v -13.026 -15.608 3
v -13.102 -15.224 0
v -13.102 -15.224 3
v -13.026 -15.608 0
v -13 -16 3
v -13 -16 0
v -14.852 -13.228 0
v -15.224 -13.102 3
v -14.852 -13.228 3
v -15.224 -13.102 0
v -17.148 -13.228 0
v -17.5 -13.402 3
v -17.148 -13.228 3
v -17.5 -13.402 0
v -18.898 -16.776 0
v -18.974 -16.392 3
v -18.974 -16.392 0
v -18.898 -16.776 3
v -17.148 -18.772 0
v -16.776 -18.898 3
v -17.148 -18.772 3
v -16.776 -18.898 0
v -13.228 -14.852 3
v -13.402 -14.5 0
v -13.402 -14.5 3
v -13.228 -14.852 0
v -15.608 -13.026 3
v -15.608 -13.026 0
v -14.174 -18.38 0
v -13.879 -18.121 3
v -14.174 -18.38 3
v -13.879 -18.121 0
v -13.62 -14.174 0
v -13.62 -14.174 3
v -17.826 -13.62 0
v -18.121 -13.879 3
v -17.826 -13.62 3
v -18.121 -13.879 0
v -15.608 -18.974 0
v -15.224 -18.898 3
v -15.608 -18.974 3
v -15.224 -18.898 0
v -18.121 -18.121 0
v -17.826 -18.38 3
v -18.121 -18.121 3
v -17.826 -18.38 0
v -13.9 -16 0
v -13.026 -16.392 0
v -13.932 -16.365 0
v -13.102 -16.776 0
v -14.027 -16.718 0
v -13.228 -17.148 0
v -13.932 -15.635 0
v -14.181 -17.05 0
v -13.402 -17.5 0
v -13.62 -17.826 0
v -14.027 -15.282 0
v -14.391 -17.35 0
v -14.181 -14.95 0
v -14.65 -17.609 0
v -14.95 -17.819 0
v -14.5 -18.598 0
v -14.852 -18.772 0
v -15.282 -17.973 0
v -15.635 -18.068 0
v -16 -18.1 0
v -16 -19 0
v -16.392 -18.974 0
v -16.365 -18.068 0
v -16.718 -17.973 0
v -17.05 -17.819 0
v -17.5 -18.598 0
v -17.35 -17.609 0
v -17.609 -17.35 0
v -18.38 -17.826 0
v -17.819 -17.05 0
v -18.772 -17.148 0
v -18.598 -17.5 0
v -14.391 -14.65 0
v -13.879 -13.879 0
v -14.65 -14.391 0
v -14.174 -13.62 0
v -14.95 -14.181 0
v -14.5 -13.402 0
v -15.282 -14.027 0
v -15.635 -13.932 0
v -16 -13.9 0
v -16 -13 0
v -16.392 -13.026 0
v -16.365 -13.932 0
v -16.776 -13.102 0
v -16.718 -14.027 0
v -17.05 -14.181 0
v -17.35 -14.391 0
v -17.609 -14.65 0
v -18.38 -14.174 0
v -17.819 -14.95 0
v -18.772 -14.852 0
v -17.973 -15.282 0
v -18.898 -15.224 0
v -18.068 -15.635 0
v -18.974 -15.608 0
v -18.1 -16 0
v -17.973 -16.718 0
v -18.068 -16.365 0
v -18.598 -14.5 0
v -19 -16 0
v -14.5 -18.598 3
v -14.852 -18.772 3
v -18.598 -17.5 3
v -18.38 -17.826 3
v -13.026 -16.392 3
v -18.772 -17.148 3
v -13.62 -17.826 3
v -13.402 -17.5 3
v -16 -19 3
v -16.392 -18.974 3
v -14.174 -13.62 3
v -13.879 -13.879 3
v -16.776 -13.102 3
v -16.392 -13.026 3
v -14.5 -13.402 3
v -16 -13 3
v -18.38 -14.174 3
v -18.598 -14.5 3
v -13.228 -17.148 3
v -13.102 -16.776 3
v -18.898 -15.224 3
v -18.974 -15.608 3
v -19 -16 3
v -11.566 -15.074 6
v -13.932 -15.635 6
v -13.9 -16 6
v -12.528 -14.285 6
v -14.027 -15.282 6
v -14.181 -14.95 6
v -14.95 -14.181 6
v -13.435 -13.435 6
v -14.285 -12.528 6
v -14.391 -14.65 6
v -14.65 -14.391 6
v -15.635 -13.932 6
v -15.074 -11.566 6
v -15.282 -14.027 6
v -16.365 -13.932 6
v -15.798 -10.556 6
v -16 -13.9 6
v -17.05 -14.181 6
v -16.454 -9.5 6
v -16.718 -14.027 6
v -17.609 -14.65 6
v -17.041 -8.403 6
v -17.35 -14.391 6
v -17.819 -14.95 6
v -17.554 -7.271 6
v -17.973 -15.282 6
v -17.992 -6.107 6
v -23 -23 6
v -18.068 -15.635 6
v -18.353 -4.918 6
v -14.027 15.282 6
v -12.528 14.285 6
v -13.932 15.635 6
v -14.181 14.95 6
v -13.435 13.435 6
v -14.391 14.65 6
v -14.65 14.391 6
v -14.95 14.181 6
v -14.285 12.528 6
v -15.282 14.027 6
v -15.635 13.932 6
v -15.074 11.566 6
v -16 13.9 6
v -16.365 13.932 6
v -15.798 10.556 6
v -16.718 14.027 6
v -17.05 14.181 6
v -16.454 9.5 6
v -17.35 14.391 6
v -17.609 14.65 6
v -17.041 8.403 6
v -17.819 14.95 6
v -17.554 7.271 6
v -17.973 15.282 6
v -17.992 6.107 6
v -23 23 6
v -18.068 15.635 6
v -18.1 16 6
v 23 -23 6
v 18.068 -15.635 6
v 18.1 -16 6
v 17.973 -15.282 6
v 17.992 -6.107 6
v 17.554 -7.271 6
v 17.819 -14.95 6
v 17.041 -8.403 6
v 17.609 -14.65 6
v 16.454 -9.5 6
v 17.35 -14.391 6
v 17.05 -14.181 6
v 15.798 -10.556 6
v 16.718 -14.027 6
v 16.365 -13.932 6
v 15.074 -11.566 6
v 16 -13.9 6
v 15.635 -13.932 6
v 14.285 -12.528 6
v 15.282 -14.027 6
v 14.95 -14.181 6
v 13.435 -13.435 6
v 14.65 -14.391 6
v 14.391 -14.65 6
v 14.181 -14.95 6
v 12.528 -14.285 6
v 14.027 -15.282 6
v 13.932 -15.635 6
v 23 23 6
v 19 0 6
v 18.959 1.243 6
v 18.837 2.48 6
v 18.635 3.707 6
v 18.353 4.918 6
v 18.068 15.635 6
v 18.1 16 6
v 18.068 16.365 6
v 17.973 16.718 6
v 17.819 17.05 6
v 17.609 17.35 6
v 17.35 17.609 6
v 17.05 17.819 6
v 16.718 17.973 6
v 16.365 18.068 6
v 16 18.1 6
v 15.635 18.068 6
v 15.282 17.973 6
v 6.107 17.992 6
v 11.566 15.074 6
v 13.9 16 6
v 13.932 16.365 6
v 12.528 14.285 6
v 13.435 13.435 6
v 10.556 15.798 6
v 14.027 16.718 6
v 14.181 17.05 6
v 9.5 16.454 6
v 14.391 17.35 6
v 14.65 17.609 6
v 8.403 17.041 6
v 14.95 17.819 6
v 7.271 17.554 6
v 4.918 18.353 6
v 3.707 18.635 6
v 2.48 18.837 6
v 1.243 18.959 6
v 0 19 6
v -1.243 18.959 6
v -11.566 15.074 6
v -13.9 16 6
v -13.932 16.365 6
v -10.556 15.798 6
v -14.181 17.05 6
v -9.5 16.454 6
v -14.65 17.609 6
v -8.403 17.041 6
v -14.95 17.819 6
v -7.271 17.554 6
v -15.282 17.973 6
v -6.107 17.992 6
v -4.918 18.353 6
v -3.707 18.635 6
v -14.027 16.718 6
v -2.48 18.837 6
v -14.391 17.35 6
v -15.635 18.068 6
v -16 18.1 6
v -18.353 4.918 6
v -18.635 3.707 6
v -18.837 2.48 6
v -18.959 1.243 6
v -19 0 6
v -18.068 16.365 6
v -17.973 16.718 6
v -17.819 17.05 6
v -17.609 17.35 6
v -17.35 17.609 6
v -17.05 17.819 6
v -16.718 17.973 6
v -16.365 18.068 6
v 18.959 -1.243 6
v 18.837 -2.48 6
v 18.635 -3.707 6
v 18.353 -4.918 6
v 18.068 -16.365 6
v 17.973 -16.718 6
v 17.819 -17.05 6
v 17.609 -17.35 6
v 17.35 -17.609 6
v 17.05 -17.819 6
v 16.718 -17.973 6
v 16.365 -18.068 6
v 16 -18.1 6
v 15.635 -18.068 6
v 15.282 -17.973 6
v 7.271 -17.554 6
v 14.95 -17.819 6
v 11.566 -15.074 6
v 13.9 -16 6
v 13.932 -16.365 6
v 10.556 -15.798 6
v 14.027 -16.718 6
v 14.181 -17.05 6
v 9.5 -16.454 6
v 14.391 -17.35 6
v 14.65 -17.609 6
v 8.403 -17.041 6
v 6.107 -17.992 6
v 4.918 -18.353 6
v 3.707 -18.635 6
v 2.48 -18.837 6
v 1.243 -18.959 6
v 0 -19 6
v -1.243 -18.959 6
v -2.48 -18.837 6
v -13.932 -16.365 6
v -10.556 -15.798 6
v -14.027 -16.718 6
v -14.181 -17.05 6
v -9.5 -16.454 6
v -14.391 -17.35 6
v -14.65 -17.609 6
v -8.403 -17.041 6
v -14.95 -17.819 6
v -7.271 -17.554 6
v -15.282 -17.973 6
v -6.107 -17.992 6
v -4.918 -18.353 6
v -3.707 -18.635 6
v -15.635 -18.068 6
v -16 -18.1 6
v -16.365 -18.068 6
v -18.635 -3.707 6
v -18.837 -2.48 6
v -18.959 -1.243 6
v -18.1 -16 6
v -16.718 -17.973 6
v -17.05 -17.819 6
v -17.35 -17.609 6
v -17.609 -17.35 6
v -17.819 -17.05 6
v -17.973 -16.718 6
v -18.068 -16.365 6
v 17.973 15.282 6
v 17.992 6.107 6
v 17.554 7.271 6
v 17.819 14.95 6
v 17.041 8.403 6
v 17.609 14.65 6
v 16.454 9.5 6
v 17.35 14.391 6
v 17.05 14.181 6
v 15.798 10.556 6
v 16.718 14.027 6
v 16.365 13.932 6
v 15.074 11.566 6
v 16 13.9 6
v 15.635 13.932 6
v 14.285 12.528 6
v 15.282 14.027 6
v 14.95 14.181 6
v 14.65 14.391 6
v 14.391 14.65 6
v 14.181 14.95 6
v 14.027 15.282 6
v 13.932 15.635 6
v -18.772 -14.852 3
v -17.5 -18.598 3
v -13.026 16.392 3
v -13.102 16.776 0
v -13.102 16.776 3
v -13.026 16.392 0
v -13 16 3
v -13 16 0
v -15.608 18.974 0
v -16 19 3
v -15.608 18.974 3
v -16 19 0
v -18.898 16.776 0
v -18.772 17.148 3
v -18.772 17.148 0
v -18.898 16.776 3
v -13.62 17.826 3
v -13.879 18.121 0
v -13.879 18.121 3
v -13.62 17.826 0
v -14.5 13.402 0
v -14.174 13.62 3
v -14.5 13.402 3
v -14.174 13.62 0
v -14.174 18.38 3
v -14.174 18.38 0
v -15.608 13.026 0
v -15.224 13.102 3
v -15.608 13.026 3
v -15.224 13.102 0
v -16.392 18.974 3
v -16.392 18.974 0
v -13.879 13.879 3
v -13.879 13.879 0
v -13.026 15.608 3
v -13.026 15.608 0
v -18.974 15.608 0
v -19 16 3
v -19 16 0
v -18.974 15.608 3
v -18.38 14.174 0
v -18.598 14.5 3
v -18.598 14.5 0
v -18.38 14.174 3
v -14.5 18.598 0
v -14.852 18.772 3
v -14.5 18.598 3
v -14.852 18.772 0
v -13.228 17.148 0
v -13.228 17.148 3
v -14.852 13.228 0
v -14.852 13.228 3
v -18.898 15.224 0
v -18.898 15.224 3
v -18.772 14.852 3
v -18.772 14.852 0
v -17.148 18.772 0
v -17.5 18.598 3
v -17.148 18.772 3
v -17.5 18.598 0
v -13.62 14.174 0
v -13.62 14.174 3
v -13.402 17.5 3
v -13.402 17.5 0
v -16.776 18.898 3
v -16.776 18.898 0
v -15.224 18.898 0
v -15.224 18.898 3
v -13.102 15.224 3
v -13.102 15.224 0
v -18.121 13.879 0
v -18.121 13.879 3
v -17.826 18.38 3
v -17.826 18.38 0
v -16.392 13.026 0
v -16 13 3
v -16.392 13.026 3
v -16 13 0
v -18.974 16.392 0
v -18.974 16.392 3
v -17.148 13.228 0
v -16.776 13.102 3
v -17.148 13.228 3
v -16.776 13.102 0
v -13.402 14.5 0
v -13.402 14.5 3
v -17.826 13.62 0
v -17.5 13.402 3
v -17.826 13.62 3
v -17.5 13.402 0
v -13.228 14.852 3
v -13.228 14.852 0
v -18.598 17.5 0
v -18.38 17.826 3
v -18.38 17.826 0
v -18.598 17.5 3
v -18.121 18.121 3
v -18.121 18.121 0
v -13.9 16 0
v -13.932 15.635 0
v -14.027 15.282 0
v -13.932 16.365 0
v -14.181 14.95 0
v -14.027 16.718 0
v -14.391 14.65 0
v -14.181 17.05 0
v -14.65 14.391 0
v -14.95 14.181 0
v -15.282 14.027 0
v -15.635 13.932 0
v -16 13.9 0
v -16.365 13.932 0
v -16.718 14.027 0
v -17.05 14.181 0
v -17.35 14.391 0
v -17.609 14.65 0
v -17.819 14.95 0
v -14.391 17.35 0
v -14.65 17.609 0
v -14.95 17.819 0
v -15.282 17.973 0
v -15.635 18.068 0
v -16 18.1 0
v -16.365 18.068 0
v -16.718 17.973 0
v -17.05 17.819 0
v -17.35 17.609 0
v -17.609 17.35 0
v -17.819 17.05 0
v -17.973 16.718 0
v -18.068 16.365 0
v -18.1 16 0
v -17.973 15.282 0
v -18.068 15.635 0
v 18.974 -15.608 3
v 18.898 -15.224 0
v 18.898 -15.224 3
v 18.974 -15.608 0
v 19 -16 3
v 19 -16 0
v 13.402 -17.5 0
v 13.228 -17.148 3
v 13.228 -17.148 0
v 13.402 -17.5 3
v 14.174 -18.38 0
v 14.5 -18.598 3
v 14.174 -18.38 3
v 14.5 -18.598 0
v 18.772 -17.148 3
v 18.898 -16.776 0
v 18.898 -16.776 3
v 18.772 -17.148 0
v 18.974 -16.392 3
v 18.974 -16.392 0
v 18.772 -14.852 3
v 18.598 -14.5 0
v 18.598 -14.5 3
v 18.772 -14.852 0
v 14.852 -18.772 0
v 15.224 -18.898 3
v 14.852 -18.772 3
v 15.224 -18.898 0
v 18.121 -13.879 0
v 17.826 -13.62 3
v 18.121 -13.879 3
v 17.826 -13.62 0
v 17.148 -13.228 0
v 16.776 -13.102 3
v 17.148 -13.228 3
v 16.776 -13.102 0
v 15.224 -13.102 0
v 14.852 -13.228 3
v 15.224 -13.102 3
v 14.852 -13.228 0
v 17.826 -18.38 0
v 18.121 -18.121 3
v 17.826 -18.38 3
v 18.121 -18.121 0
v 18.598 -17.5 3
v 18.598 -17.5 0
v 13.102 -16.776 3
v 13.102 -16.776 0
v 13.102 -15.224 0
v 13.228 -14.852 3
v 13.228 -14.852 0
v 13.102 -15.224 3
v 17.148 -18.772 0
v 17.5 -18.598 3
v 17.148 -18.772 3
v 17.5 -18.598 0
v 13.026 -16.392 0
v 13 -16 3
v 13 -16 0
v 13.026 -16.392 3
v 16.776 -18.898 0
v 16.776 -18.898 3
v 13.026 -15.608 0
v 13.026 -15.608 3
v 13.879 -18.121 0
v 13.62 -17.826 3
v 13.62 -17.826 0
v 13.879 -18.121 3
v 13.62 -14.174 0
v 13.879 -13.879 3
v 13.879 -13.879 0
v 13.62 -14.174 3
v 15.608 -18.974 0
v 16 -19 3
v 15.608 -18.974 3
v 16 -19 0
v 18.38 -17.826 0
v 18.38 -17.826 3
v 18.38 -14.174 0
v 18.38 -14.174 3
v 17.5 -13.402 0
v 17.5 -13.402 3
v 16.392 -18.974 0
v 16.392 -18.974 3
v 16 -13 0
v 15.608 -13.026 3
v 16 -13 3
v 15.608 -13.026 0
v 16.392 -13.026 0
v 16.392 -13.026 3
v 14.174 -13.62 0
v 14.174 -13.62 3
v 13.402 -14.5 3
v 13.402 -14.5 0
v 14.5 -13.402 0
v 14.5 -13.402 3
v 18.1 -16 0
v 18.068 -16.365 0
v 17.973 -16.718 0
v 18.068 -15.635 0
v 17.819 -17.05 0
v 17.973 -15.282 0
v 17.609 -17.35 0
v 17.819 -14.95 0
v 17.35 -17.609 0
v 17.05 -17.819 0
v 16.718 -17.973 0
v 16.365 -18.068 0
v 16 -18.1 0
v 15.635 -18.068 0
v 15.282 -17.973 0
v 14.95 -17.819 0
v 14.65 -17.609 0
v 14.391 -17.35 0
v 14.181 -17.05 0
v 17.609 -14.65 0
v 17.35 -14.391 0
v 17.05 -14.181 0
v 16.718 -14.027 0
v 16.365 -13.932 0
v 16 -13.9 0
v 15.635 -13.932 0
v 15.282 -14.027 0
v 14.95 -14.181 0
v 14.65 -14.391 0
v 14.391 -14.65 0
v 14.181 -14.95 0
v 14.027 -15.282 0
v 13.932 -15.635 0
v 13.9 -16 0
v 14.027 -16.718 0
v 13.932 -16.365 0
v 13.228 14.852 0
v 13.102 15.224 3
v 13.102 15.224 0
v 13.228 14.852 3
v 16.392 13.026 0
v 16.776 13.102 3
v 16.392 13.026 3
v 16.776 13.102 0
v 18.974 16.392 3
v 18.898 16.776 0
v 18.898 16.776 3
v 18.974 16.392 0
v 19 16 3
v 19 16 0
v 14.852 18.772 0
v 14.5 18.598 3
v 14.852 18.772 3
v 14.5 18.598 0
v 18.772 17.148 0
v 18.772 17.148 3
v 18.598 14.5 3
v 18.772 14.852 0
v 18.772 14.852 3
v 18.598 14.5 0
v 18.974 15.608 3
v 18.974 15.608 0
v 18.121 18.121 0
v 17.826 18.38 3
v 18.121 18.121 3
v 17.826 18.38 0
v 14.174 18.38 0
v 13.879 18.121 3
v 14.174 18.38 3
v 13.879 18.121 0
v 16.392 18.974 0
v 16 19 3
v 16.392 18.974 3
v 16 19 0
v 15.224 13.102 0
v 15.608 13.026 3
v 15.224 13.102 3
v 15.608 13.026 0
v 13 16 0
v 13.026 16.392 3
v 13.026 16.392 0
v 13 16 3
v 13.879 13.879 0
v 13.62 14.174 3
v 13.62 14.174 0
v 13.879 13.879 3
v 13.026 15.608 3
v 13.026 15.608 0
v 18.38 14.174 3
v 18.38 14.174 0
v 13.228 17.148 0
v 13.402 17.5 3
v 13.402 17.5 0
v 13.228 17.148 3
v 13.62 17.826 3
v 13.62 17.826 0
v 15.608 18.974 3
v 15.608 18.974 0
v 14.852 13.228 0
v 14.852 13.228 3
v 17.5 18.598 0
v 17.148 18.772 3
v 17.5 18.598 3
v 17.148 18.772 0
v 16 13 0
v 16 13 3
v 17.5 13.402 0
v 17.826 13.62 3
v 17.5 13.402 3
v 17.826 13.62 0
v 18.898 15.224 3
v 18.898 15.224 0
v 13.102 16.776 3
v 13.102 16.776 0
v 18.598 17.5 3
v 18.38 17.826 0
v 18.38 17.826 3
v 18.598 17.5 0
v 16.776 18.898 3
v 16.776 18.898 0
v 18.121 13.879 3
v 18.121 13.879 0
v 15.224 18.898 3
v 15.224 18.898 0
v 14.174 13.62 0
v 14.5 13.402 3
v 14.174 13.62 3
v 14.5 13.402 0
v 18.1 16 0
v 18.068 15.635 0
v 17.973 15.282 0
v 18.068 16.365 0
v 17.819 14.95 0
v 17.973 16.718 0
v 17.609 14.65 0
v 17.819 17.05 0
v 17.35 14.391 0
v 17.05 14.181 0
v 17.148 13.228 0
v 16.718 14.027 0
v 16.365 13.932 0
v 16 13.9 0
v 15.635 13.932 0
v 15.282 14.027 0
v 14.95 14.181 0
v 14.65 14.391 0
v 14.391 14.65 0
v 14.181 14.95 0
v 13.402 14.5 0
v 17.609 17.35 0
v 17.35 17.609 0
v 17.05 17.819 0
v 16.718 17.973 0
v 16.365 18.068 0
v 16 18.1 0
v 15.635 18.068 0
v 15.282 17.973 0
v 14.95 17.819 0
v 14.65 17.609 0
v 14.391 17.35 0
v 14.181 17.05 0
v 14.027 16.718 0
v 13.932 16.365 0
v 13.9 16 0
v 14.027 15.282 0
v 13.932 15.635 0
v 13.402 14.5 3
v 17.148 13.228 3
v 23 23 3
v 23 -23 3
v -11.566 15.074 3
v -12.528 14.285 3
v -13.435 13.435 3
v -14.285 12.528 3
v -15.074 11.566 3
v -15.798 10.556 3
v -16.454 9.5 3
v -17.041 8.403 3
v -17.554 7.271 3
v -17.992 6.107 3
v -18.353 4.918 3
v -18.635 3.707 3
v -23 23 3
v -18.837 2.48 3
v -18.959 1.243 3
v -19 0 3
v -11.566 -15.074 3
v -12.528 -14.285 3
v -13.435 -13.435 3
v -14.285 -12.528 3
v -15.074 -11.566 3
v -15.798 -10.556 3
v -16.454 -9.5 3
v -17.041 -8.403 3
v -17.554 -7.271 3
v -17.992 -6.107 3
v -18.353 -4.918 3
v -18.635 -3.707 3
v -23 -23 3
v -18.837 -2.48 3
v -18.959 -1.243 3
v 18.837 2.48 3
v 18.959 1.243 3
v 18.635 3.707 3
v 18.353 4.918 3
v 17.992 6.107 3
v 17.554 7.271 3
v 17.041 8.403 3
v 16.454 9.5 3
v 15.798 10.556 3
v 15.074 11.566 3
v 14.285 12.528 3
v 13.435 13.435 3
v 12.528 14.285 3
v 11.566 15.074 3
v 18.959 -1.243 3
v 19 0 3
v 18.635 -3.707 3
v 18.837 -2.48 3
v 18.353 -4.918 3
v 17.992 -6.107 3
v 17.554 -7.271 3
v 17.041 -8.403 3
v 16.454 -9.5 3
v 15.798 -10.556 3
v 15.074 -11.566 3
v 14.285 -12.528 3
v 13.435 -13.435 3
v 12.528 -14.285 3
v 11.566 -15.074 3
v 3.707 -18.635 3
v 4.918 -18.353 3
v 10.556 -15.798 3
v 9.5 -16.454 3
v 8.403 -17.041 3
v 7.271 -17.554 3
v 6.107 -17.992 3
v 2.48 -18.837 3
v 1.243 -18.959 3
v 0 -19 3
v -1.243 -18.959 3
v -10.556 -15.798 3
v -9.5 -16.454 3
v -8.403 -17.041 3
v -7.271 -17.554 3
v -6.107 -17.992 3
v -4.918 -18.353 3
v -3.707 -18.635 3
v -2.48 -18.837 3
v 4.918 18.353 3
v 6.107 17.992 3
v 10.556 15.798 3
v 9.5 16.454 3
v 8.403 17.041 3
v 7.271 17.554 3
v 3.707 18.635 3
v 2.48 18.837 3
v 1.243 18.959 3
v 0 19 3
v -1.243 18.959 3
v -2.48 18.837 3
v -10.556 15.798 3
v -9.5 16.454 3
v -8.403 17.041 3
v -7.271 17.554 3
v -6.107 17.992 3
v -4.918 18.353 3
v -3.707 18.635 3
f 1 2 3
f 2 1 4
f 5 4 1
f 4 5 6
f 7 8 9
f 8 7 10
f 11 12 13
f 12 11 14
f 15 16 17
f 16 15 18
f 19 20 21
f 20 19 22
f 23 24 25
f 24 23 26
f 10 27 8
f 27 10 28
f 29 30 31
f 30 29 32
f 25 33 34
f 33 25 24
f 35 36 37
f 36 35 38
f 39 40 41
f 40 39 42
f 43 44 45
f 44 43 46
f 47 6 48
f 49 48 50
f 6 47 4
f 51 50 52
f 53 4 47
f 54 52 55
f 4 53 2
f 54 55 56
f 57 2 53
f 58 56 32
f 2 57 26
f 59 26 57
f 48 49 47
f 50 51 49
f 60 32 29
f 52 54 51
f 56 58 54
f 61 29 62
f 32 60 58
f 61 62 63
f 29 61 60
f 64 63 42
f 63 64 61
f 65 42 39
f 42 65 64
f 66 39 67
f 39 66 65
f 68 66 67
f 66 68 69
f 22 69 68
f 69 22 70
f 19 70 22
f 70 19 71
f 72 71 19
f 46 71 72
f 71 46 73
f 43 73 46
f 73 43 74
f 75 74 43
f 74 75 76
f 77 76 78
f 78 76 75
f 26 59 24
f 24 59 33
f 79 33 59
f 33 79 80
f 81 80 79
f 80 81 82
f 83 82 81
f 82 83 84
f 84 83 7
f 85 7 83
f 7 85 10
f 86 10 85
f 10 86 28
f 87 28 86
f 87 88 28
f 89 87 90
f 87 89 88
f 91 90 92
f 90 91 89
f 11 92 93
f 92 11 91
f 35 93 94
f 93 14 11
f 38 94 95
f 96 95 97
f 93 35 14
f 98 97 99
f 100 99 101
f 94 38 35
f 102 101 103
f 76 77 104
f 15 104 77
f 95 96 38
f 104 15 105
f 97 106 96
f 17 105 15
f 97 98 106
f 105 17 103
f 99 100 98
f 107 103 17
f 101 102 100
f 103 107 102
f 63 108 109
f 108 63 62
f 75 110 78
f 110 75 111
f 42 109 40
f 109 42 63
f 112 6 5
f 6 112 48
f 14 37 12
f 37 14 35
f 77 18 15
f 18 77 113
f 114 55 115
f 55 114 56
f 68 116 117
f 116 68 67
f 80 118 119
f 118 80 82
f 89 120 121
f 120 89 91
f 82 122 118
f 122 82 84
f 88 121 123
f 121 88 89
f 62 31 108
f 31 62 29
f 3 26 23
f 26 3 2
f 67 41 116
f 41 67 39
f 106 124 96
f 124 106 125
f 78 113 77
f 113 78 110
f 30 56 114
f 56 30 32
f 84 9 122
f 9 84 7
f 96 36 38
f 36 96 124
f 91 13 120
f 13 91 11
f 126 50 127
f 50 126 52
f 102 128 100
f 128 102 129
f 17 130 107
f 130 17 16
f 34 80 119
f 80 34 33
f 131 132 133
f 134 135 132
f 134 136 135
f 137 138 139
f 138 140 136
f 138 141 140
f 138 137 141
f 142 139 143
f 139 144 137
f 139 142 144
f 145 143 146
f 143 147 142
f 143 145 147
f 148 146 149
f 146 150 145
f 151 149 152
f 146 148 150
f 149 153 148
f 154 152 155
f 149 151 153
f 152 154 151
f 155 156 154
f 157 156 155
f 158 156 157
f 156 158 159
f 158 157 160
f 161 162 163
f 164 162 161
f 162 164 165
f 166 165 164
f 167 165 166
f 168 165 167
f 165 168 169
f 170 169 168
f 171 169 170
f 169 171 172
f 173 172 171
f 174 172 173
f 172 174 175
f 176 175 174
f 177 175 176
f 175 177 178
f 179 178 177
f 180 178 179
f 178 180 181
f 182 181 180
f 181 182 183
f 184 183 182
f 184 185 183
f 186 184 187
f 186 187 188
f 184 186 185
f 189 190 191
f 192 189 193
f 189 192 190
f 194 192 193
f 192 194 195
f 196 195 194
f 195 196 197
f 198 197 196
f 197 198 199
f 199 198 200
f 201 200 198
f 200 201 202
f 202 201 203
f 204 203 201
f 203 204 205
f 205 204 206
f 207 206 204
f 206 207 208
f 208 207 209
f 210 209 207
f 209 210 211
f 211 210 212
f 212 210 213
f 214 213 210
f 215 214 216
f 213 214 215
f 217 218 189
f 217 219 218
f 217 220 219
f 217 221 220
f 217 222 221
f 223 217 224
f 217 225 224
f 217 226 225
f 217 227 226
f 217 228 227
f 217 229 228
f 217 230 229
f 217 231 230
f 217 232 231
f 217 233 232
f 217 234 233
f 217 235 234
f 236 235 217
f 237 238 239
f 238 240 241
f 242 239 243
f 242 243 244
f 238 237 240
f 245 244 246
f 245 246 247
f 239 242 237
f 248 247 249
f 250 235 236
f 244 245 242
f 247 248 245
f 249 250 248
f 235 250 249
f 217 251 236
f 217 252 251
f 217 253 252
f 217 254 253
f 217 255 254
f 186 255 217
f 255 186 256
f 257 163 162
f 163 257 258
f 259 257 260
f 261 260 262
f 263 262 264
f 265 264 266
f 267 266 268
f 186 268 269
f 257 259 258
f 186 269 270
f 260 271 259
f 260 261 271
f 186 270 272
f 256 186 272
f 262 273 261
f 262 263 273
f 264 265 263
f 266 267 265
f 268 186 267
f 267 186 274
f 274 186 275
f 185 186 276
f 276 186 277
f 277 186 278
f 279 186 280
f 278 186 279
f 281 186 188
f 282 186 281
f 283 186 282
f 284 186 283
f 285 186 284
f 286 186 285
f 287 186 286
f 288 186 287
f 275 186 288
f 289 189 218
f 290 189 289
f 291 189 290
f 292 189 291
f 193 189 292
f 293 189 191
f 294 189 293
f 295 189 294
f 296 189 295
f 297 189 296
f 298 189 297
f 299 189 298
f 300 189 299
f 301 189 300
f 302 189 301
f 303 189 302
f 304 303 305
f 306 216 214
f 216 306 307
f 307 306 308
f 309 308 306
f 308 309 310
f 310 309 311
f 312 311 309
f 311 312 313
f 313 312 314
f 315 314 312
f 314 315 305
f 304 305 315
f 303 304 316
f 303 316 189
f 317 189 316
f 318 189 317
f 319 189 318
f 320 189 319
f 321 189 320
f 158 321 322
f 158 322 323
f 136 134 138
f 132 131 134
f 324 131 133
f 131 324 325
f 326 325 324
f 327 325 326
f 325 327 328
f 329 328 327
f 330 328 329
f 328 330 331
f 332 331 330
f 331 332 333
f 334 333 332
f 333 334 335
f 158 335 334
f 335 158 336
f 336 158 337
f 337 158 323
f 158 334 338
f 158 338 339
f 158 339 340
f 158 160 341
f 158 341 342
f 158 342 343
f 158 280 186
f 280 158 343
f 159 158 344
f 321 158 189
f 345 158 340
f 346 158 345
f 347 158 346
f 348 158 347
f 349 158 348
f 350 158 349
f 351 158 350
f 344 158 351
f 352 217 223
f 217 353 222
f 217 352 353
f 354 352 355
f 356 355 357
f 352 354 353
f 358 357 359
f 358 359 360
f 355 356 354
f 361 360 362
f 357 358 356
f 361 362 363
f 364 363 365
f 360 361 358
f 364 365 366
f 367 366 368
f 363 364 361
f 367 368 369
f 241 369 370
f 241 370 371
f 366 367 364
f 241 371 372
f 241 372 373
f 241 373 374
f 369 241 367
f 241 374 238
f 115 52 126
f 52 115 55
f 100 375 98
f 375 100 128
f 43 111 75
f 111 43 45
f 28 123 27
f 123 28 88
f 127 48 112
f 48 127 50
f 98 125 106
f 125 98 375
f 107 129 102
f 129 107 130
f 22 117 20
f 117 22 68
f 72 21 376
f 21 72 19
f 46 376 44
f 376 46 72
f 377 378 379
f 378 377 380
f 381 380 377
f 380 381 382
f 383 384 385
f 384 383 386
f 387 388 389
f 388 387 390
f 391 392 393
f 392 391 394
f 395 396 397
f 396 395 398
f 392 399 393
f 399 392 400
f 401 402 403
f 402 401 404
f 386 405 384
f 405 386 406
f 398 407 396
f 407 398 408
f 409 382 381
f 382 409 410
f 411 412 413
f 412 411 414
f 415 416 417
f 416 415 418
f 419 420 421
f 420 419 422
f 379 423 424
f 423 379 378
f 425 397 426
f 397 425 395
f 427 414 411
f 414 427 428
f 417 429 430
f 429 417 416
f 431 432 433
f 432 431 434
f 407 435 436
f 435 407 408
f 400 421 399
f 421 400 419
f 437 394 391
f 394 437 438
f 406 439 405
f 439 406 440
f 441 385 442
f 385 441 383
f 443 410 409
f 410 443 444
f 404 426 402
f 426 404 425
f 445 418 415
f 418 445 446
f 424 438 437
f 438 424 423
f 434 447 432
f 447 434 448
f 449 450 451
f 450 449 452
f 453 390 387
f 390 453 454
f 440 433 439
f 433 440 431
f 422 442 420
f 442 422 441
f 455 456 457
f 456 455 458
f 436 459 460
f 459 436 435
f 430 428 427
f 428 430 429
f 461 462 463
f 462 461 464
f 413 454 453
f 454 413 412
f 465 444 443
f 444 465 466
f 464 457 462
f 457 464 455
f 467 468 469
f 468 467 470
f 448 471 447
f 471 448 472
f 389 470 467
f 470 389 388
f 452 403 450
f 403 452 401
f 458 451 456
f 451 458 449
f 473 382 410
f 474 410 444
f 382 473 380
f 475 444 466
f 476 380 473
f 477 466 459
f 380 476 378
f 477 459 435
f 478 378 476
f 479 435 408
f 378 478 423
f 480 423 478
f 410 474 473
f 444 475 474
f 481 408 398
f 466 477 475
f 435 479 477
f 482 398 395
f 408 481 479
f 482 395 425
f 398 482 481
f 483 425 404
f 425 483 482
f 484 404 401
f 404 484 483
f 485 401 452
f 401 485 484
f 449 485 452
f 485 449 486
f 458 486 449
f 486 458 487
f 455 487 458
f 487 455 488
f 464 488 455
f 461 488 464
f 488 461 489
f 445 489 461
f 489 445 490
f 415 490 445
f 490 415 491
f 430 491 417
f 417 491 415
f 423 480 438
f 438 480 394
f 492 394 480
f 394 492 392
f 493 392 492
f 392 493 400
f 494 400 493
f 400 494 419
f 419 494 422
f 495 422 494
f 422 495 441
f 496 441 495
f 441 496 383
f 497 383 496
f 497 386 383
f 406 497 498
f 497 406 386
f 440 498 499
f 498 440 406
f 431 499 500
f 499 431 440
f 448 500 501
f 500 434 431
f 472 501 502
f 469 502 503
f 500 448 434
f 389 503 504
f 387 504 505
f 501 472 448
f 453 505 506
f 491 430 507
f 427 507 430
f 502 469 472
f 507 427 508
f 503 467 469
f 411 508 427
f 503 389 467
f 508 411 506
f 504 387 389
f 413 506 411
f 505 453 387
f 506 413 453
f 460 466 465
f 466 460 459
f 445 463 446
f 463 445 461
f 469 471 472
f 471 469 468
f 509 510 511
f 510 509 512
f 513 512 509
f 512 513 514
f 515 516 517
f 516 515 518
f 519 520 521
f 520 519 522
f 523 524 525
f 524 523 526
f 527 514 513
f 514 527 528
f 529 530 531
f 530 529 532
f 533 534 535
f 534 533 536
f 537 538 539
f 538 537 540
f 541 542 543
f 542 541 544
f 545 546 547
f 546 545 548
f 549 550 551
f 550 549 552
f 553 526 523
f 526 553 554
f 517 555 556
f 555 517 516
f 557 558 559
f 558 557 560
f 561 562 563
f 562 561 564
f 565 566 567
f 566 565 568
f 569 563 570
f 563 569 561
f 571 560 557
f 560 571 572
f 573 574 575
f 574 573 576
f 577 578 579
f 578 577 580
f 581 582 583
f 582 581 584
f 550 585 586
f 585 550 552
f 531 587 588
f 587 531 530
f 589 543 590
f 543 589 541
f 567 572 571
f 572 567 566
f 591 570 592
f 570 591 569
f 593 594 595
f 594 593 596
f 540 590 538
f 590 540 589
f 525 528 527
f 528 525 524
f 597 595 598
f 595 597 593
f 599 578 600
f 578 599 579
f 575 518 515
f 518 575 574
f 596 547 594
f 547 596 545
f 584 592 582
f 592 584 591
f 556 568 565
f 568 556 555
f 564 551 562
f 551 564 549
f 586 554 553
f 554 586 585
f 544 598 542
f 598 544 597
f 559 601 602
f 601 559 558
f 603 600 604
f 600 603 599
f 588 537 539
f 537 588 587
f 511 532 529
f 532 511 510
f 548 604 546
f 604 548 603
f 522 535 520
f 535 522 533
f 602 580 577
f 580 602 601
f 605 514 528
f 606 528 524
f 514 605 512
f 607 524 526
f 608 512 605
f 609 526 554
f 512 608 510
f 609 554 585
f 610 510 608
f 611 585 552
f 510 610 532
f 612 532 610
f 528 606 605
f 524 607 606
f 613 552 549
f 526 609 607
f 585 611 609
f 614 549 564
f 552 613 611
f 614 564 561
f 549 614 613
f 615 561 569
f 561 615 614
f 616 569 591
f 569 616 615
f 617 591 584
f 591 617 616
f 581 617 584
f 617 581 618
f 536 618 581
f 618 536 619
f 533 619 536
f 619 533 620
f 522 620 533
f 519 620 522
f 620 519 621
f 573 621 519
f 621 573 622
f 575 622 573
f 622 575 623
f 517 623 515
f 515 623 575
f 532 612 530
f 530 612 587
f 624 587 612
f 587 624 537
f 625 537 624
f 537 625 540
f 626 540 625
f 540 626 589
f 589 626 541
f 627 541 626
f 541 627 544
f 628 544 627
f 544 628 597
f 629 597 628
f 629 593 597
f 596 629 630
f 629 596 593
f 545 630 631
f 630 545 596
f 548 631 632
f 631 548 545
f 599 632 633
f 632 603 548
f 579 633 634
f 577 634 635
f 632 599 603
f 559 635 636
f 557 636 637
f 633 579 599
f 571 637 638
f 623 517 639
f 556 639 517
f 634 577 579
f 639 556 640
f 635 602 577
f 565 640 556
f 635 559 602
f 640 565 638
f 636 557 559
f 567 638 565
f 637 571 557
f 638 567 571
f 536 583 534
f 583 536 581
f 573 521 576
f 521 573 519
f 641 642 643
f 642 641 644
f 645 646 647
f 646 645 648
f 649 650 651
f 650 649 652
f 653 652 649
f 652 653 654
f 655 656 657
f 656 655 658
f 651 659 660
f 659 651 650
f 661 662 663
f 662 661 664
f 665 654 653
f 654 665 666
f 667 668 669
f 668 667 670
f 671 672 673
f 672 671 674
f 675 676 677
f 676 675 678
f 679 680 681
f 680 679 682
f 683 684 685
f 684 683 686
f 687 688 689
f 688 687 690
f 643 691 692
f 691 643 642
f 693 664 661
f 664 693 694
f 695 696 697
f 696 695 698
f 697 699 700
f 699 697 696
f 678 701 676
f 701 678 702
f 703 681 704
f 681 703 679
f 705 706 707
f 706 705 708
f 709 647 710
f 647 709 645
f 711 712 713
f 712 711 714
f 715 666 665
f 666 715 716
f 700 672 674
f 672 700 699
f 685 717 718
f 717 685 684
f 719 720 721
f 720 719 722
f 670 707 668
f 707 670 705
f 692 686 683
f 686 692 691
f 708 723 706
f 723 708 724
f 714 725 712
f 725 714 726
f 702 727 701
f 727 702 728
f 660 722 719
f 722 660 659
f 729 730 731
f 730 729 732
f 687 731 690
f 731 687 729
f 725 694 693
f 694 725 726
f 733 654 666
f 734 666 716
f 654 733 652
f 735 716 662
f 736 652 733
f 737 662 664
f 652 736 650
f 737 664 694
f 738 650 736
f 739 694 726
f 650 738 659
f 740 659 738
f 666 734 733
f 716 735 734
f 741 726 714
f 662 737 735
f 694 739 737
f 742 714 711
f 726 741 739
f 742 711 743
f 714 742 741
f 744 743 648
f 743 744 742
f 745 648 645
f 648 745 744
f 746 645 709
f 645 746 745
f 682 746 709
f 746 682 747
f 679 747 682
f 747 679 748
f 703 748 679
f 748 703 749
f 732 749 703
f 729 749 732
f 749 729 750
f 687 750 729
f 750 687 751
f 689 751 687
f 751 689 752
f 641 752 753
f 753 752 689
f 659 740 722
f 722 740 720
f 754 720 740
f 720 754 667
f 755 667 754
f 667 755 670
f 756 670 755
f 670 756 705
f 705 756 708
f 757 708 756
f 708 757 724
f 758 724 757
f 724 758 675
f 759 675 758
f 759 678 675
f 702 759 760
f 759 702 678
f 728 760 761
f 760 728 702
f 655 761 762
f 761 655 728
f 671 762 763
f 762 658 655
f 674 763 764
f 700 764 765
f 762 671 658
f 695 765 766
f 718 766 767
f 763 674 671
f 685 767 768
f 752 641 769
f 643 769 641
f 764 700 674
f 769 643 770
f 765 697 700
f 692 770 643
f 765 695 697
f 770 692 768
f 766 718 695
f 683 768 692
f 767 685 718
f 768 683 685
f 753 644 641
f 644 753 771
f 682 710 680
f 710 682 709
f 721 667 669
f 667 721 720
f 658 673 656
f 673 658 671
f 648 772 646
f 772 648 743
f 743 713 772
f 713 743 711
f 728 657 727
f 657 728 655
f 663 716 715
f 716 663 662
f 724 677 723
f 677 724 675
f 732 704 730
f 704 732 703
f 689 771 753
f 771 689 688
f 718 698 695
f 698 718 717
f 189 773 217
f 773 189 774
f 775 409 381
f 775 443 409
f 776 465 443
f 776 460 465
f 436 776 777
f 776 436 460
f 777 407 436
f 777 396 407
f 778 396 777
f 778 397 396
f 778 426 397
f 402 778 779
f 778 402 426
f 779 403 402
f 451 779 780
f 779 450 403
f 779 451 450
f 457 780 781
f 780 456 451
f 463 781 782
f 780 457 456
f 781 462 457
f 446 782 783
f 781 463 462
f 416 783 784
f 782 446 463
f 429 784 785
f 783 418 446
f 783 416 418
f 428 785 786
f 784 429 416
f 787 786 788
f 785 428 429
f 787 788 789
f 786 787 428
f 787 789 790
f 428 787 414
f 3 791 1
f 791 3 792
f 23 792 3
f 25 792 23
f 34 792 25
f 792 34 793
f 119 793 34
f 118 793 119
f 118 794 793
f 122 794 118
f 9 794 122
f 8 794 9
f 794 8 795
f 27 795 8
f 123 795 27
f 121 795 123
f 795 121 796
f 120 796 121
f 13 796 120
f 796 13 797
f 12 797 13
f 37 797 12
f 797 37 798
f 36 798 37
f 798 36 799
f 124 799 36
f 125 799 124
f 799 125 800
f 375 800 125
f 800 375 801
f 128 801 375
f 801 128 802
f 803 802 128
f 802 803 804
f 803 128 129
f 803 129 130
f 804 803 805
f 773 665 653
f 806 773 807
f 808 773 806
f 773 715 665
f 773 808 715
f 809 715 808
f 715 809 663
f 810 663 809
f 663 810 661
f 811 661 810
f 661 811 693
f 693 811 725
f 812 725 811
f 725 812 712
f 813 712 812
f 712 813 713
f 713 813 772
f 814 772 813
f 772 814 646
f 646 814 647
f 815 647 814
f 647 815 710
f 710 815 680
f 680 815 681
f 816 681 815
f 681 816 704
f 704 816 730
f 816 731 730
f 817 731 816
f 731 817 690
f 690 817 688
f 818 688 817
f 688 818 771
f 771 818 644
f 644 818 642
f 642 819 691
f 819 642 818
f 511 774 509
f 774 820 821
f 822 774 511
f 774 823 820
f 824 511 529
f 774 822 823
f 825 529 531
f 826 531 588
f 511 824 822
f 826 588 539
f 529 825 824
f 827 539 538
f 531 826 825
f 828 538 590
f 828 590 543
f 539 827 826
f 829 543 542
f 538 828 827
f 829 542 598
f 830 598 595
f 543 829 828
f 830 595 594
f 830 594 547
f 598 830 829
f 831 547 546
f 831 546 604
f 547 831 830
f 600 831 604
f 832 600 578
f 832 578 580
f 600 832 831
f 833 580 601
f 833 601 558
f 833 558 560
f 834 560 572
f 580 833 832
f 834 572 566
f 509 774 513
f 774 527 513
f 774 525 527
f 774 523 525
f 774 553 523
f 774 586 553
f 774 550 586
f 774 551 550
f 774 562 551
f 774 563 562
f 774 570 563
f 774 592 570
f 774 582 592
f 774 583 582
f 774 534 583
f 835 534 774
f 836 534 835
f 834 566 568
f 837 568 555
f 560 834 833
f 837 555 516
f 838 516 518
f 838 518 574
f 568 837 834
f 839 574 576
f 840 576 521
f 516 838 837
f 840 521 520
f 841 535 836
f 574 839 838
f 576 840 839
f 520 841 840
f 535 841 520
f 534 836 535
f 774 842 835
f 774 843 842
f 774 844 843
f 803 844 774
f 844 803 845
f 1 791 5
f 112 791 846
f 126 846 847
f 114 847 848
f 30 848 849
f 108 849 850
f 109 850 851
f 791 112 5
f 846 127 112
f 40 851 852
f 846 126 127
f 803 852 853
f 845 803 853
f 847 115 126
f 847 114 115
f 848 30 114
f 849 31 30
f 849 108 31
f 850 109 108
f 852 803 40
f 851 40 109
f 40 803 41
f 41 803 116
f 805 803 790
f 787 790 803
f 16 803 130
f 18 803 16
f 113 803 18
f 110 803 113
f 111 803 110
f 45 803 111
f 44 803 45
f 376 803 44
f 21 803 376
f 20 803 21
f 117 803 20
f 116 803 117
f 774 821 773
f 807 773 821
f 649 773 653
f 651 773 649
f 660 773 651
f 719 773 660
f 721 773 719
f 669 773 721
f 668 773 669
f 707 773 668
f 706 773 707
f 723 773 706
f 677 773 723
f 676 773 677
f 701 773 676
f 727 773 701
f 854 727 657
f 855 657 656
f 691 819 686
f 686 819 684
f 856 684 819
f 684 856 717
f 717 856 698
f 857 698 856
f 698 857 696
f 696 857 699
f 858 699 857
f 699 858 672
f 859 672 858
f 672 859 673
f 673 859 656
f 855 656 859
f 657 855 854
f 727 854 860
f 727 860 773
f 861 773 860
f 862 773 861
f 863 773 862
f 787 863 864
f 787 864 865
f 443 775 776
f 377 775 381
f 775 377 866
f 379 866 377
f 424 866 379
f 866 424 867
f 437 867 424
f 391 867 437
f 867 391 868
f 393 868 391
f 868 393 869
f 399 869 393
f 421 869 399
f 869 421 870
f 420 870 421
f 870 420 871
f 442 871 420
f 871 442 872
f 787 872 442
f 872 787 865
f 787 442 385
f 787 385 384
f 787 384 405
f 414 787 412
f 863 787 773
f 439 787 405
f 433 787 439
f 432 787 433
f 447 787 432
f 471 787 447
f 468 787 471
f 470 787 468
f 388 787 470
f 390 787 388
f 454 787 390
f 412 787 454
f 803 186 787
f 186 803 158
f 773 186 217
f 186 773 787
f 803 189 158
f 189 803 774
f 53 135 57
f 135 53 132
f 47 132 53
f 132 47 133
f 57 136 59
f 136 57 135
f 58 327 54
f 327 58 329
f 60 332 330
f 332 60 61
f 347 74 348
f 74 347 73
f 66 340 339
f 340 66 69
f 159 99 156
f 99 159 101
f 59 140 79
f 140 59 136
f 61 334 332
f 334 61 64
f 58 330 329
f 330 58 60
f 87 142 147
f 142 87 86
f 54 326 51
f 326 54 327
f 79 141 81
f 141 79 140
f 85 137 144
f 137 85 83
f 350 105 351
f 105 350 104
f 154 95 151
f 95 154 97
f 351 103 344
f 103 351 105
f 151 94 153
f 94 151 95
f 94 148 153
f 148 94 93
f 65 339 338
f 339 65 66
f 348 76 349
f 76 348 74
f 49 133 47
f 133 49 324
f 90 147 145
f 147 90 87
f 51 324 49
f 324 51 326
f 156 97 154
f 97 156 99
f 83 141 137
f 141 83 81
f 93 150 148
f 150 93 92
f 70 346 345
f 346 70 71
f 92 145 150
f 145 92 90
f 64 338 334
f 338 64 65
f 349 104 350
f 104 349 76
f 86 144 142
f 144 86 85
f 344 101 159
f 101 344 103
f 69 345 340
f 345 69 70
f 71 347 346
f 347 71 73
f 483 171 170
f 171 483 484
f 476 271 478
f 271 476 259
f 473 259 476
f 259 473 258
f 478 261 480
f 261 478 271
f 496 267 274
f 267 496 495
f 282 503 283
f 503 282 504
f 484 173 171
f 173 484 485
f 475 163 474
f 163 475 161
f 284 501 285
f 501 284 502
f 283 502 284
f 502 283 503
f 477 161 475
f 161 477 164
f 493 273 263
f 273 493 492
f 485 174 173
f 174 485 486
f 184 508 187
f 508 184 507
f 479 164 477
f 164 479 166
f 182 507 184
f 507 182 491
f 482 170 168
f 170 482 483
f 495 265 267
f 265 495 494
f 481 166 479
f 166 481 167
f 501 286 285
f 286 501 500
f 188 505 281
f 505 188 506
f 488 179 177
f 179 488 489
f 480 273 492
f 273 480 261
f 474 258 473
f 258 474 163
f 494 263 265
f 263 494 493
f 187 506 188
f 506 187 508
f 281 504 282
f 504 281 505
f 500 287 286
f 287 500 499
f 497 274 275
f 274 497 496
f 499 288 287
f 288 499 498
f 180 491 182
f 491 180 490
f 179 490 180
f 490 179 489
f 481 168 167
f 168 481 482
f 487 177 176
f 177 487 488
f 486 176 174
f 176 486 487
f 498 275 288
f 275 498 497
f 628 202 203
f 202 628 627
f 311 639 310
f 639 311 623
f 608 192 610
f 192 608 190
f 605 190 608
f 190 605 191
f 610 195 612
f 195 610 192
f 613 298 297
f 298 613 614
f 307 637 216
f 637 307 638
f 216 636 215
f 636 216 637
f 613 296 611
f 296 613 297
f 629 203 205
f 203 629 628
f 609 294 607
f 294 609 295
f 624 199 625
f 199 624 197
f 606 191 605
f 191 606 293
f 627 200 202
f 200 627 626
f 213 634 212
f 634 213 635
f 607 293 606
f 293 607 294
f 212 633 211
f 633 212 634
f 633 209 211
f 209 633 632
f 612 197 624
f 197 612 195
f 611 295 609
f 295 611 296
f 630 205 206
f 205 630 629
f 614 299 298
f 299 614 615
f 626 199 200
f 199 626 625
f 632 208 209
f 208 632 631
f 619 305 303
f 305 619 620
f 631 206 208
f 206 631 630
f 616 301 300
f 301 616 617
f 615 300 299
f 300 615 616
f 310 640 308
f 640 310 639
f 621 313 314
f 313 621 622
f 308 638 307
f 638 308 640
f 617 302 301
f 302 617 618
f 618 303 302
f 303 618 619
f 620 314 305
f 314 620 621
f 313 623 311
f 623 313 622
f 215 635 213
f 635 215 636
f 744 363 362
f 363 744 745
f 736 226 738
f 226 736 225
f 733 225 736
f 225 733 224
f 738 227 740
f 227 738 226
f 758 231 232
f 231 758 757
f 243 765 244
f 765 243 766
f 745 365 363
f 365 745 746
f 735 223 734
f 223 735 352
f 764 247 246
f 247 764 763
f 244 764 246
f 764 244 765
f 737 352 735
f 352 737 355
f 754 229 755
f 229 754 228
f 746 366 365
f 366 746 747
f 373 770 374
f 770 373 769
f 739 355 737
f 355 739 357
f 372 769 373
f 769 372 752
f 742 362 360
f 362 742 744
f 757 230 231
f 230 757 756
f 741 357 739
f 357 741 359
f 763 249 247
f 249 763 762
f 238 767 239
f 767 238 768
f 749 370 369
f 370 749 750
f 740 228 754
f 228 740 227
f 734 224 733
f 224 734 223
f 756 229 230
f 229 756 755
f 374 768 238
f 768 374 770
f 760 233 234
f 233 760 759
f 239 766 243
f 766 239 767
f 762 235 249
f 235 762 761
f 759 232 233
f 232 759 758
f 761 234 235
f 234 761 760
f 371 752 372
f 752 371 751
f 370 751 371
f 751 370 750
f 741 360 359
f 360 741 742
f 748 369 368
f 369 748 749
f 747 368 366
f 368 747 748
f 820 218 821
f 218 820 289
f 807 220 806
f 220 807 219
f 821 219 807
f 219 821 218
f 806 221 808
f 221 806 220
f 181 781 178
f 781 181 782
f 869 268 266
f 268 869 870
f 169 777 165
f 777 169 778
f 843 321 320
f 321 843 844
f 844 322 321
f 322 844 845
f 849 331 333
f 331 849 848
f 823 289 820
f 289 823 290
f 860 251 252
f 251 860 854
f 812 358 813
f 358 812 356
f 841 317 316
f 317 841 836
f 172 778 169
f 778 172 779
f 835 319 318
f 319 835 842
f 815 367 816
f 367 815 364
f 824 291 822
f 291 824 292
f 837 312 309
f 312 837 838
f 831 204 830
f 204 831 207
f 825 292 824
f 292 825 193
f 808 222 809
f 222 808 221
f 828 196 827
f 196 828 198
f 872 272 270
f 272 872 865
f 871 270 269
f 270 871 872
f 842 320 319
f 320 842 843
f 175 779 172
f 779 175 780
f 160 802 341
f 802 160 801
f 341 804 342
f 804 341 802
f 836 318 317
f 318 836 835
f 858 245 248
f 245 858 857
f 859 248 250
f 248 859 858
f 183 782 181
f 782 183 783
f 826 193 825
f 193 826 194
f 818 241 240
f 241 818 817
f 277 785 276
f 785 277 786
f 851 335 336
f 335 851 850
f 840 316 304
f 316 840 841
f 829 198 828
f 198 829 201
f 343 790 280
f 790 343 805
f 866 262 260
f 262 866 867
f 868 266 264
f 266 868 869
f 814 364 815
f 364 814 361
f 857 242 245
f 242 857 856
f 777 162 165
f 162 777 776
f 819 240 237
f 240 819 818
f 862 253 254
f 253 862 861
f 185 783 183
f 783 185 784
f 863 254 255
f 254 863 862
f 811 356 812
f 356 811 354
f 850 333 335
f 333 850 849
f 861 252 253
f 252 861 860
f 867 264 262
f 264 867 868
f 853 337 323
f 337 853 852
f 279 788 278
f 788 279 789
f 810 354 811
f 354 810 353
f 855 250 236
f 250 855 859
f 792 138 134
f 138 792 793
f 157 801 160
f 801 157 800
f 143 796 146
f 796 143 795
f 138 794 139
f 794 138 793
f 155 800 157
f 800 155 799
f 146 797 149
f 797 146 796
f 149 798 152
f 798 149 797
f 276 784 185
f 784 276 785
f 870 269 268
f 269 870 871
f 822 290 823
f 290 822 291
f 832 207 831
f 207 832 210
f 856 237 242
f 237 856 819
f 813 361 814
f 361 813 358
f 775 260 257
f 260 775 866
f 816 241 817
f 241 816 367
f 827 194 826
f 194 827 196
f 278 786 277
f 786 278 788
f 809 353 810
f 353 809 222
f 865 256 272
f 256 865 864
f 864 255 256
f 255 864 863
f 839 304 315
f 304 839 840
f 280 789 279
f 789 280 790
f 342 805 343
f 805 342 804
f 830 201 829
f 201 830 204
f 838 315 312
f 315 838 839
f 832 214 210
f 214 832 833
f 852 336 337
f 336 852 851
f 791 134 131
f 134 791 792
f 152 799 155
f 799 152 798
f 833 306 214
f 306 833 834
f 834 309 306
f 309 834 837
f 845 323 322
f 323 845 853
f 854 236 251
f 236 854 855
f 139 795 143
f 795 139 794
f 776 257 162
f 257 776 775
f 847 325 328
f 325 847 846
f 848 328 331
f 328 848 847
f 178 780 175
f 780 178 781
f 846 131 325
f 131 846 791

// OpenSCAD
// file: parts/fan_guard.scad
// Fan guard: a flat plate with a centered circular air opening, held
// standoff_height above the fan face by four M3-bored posts at the fan's four
// corner mounting stations (stud_pitch/2 on each axis).
//
// Coordinate frame (guard local, matching the case's fan interface):
//   - the fan face lies in the z = 0 plane, fan center at the origin in x/y;
//   - the posts run from z = 0 (fan face) up through the plate;
//   - the plate spans z = standoff_height .. standoff_height + plate_thickness;
//   - airflow passes axially through the center opening and radially through
//     the perimeter gap between the fan face (40 mm) and the plate (plate_size).
//
// The posts are kept OUTSIDE the blade circle (fan_blade_d) so the spinning
// tips can never contact the guard; see the blade-clearance asserts below.
// Each post is bored to stud_bore_d (== the case's fan_mount_hole_d) so the
// case's existing M3 fan screws pass through case hole -> fan hole -> post.

// Fan center is the origin in x/y.
function fan_center_x() = 0;
function fan_center_y() = 0;

// Post station offset from the fan center (half the 32 mm pitch).
function stud_offset() = stud_pitch / 2;
function stud_center_r() = sqrt(2) * stud_offset(); // radius of a station from center.
function stud_r_out() = stud_outer_d / 2;
function stud_r_in() = stud_bore_d / 2;
function cutout_r() = center_cutout_d / 2;
// Post outer edge vs the center opening edge (default: 19.6 - 3 - 19 = 0.6 mm).
function stud_opening_clearance() = stud_center_r() - stud_r_out() - cutout_r();

// Post vertical extent: from the fan face (z = 0) through the full plate
// thickness, so the embed into the plate equals plate_thickness and is a
// positive-volume join (asserted >= minimum_structural_overlap).
function stud_top_z() = standoff_height + plate_thickness;
function plate_bottom_z() = standoff_height;
function plate_top_z() = standoff_height + plate_thickness;

// Margin from a post's outer edge to the blade circle (must be positive).
function blade_clearance_actual() = stud_center_r() - stud_r_out() - fan_blade_d / 2;
// Radial clearance from the blade circle to the center opening edge.
function opening_blade_clearance() = (center_cutout_d - fan_blade_d) / 2;
// Material between the outer edge of a screw bore and the nearest plate edge.
function bore_edge_margin() = plate_size / 2 - stud_offset() - stud_r_in();
// Annulus of material around each M3 bore inside a post.
function stud_bore_annulus() = stud_r_out() - stud_r_in();
// Flat ring width between the center opening and the plate edge.
function guard_ring_width() = (plate_size - center_cutout_d) / 2;

module fan_guard() {
  // --- Structural asserts (AGENTS.md section 10) ---
  assert(minimum_structural_overlap >= minimum_wall_thickness,
    "Minimum structural overlap is below the minimum wall thickness.");
  assert(minimum_wall_thickness > 0 && minimum_internal_edge_width > 0,
    "Structural minima must be positive.");
  assert(standoff_height > 0, "Standoff height must be positive.");
  assert(plate_thickness >= minimum_structural_overlap,
    "Post embed (plate thickness) is below the minimum structural overlap.");
  assert(plate_size >= fan_face_d + 2 * minimum_internal_edge_width,
    "Plate does not leave a minimum-width flat ring beyond the fan face.");
  assert(guard_ring_width() >= minimum_internal_edge_width,
    "Guard ring between the center opening and the plate edge is too narrow.");
  // Center opening edge vs the blade circle: with center_cutout_d ==
  // fan_blade_d (38) the opening edge coincides with the blade circle. The
  // posts (outside the opening) and the perimeter ring are what protect the
  // tips, so this is a documented 0 floor.
  assert(opening_blade_clearance() >= 0,
    "Center opening intrudes on the blade circle.");
  // Post outer edge vs the blade circle (default: 19.63 - 3 - 19 = 0.63 mm).
  assert(blade_clearance_actual() >= 0.5,
    "A post touches the blade circle (documented 0.5 mm floor).");
  // Post outer edge vs the center opening edge (default: 19.63 - 3 - 19 = 0.63
  // mm): keeps a post off the opening rim.
  assert(stud_opening_clearance() >= 0.5,
    "A post touches the center opening rim (documented 0.5 mm floor).");
  assert(bore_edge_margin() >= minimum_internal_edge_width,
    "Screw bore leaves too little material to the plate edge.");
  // Documented relaxation (same pattern as the micro_cyberdeck_case fan-wall
  // ligament exceptions): the M3 bore annulus inside a post is constrained by
  // the blade circle; at 32 mm pitch a >= 3 mm annulus would put the post
  // inside the blade circle, so it is asserted at a documented 0.8 mm floor.
  assert(stud_bore_annulus() >= 0.8,
    "Post bore annulus is below the documented 0.8 mm floor for an M3 standoff.");
  assert(stud_bore_d > 0 && stud_outer_d > stud_bore_d,
    "Stud bore dimensions are invalid.");

  // --- Geometry ---
  difference() {
    union() {
      // Guard plate (flat air guard), centered on the fan. The x/y position is
      // set explicitly by translate (this OpenSCAD build ignores the vector
      // center=[...] form), spanning [-plate_size/2, plate_size/2] in x/y.
      translate([-plate_size / 2, -plate_size / 2, plate_bottom_z()])
        cube([plate_size, plate_size, plate_thickness]);
      // Four standoff posts at the fan corner stations, running from the fan
      // face through the full plate thickness (positive-volume join).
      for (px = [-1, 1])
        for (py = [-1, 1])
          translate([px * stud_offset(), py * stud_offset(), 0])
            cylinder(d = stud_outer_d, h = stud_top_z(), $fn = 48);
    }
    // Center air opening through the plate (and the post crescents it trims).
    translate([fan_center_x(), fan_center_y(), -boolean_epsilon])
      cylinder(d = center_cutout_d, h = stud_top_z() + 2 * boolean_epsilon, $fn = 96);
    // M3 screw bores through each post and the plate.
    for (px = [-1, 1])
      for (py = [-1, 1])
        translate([px * stud_offset(), py * stud_offset(), -boolean_epsilon])
          cylinder(d = stud_bore_d, h = stud_top_z() + 2 * boolean_epsilon, $fn = 36);
  }
}
// file: lib/defaults.scad
// Fan guard defaults, in millimeters.
// Coordinate datum: the guard plate's bottom face lies in the z = 0 plane,
// centered on the origin in x/y. The plate is the air guard; the studs hang
// below it toward the fan (negative z) and carry M3-bore standoffs at the
// four corner stations of a 40 mm fan.

part_id = is_undef(part_id) ? 1 : part_id;

// Structural minima (AGENTS.md section 10).
minimum_wall_thickness = is_undef(minimum_wall_thickness) ? 3.0 : minimum_wall_thickness;
minimum_structural_overlap = is_undef(minimum_structural_overlap) ? minimum_wall_thickness : minimum_structural_overlap;
minimum_internal_edge_width = is_undef(minimum_internal_edge_width) ? minimum_wall_thickness : minimum_internal_edge_width;

// Guard plate. plate_size 46 with a Ø38 center opening leaves a 4 mm flat ring
// (>= 3 mm minimum wall) and the four Ø6 posts at the 32 mm corner stations
// clear both the opening (0.6 mm) and the plate edge (4 mm).
plate_size = is_undef(plate_size) ? 46.0 : plate_size;
plate_thickness = is_undef(plate_thickness) ? 3.0 : plate_thickness;
center_cutout_d = is_undef(center_cutout_d) ? 38.0 : center_cutout_d;

// Standoff studs (one at each of the four fan corner stations).
standoff_height = is_undef(standoff_height) ? 3.0 : standoff_height;
stud_outer_d = is_undef(stud_outer_d) ? 6.0 : stud_outer_d;
stud_bore_d = is_undef(stud_bore_d) ? 4.2 : stud_bore_d; // matches case fan_mount_hole_d (M3).
stud_pitch = is_undef(stud_pitch) ? 32.0 : stud_pitch;   // matches case fan_hole_spacing.

// Reference fan envelope used only by asserts (not geometry).
fan_face_d = is_undef(fan_face_d) ? 40.0 : fan_face_d;
fan_blade_d = is_undef(fan_blade_d) ? 38.0 : fan_blade_d;

boolean_epsilon = is_undef(boolean_epsilon) ? 0.01 : boolean_epsilon;
// main file
// Scripted export entrypoint for the fan guard.
// part_id map: 1 = printable fan guard (plate + four M3-bored standoff posts).

include <lib/defaults.scad>;
include <parts/fan_guard.scad>;

if (part_id == 1) {
  fan_guard();
} else {
  assert(false, str("Unknown part_id: ", part_id));
}
